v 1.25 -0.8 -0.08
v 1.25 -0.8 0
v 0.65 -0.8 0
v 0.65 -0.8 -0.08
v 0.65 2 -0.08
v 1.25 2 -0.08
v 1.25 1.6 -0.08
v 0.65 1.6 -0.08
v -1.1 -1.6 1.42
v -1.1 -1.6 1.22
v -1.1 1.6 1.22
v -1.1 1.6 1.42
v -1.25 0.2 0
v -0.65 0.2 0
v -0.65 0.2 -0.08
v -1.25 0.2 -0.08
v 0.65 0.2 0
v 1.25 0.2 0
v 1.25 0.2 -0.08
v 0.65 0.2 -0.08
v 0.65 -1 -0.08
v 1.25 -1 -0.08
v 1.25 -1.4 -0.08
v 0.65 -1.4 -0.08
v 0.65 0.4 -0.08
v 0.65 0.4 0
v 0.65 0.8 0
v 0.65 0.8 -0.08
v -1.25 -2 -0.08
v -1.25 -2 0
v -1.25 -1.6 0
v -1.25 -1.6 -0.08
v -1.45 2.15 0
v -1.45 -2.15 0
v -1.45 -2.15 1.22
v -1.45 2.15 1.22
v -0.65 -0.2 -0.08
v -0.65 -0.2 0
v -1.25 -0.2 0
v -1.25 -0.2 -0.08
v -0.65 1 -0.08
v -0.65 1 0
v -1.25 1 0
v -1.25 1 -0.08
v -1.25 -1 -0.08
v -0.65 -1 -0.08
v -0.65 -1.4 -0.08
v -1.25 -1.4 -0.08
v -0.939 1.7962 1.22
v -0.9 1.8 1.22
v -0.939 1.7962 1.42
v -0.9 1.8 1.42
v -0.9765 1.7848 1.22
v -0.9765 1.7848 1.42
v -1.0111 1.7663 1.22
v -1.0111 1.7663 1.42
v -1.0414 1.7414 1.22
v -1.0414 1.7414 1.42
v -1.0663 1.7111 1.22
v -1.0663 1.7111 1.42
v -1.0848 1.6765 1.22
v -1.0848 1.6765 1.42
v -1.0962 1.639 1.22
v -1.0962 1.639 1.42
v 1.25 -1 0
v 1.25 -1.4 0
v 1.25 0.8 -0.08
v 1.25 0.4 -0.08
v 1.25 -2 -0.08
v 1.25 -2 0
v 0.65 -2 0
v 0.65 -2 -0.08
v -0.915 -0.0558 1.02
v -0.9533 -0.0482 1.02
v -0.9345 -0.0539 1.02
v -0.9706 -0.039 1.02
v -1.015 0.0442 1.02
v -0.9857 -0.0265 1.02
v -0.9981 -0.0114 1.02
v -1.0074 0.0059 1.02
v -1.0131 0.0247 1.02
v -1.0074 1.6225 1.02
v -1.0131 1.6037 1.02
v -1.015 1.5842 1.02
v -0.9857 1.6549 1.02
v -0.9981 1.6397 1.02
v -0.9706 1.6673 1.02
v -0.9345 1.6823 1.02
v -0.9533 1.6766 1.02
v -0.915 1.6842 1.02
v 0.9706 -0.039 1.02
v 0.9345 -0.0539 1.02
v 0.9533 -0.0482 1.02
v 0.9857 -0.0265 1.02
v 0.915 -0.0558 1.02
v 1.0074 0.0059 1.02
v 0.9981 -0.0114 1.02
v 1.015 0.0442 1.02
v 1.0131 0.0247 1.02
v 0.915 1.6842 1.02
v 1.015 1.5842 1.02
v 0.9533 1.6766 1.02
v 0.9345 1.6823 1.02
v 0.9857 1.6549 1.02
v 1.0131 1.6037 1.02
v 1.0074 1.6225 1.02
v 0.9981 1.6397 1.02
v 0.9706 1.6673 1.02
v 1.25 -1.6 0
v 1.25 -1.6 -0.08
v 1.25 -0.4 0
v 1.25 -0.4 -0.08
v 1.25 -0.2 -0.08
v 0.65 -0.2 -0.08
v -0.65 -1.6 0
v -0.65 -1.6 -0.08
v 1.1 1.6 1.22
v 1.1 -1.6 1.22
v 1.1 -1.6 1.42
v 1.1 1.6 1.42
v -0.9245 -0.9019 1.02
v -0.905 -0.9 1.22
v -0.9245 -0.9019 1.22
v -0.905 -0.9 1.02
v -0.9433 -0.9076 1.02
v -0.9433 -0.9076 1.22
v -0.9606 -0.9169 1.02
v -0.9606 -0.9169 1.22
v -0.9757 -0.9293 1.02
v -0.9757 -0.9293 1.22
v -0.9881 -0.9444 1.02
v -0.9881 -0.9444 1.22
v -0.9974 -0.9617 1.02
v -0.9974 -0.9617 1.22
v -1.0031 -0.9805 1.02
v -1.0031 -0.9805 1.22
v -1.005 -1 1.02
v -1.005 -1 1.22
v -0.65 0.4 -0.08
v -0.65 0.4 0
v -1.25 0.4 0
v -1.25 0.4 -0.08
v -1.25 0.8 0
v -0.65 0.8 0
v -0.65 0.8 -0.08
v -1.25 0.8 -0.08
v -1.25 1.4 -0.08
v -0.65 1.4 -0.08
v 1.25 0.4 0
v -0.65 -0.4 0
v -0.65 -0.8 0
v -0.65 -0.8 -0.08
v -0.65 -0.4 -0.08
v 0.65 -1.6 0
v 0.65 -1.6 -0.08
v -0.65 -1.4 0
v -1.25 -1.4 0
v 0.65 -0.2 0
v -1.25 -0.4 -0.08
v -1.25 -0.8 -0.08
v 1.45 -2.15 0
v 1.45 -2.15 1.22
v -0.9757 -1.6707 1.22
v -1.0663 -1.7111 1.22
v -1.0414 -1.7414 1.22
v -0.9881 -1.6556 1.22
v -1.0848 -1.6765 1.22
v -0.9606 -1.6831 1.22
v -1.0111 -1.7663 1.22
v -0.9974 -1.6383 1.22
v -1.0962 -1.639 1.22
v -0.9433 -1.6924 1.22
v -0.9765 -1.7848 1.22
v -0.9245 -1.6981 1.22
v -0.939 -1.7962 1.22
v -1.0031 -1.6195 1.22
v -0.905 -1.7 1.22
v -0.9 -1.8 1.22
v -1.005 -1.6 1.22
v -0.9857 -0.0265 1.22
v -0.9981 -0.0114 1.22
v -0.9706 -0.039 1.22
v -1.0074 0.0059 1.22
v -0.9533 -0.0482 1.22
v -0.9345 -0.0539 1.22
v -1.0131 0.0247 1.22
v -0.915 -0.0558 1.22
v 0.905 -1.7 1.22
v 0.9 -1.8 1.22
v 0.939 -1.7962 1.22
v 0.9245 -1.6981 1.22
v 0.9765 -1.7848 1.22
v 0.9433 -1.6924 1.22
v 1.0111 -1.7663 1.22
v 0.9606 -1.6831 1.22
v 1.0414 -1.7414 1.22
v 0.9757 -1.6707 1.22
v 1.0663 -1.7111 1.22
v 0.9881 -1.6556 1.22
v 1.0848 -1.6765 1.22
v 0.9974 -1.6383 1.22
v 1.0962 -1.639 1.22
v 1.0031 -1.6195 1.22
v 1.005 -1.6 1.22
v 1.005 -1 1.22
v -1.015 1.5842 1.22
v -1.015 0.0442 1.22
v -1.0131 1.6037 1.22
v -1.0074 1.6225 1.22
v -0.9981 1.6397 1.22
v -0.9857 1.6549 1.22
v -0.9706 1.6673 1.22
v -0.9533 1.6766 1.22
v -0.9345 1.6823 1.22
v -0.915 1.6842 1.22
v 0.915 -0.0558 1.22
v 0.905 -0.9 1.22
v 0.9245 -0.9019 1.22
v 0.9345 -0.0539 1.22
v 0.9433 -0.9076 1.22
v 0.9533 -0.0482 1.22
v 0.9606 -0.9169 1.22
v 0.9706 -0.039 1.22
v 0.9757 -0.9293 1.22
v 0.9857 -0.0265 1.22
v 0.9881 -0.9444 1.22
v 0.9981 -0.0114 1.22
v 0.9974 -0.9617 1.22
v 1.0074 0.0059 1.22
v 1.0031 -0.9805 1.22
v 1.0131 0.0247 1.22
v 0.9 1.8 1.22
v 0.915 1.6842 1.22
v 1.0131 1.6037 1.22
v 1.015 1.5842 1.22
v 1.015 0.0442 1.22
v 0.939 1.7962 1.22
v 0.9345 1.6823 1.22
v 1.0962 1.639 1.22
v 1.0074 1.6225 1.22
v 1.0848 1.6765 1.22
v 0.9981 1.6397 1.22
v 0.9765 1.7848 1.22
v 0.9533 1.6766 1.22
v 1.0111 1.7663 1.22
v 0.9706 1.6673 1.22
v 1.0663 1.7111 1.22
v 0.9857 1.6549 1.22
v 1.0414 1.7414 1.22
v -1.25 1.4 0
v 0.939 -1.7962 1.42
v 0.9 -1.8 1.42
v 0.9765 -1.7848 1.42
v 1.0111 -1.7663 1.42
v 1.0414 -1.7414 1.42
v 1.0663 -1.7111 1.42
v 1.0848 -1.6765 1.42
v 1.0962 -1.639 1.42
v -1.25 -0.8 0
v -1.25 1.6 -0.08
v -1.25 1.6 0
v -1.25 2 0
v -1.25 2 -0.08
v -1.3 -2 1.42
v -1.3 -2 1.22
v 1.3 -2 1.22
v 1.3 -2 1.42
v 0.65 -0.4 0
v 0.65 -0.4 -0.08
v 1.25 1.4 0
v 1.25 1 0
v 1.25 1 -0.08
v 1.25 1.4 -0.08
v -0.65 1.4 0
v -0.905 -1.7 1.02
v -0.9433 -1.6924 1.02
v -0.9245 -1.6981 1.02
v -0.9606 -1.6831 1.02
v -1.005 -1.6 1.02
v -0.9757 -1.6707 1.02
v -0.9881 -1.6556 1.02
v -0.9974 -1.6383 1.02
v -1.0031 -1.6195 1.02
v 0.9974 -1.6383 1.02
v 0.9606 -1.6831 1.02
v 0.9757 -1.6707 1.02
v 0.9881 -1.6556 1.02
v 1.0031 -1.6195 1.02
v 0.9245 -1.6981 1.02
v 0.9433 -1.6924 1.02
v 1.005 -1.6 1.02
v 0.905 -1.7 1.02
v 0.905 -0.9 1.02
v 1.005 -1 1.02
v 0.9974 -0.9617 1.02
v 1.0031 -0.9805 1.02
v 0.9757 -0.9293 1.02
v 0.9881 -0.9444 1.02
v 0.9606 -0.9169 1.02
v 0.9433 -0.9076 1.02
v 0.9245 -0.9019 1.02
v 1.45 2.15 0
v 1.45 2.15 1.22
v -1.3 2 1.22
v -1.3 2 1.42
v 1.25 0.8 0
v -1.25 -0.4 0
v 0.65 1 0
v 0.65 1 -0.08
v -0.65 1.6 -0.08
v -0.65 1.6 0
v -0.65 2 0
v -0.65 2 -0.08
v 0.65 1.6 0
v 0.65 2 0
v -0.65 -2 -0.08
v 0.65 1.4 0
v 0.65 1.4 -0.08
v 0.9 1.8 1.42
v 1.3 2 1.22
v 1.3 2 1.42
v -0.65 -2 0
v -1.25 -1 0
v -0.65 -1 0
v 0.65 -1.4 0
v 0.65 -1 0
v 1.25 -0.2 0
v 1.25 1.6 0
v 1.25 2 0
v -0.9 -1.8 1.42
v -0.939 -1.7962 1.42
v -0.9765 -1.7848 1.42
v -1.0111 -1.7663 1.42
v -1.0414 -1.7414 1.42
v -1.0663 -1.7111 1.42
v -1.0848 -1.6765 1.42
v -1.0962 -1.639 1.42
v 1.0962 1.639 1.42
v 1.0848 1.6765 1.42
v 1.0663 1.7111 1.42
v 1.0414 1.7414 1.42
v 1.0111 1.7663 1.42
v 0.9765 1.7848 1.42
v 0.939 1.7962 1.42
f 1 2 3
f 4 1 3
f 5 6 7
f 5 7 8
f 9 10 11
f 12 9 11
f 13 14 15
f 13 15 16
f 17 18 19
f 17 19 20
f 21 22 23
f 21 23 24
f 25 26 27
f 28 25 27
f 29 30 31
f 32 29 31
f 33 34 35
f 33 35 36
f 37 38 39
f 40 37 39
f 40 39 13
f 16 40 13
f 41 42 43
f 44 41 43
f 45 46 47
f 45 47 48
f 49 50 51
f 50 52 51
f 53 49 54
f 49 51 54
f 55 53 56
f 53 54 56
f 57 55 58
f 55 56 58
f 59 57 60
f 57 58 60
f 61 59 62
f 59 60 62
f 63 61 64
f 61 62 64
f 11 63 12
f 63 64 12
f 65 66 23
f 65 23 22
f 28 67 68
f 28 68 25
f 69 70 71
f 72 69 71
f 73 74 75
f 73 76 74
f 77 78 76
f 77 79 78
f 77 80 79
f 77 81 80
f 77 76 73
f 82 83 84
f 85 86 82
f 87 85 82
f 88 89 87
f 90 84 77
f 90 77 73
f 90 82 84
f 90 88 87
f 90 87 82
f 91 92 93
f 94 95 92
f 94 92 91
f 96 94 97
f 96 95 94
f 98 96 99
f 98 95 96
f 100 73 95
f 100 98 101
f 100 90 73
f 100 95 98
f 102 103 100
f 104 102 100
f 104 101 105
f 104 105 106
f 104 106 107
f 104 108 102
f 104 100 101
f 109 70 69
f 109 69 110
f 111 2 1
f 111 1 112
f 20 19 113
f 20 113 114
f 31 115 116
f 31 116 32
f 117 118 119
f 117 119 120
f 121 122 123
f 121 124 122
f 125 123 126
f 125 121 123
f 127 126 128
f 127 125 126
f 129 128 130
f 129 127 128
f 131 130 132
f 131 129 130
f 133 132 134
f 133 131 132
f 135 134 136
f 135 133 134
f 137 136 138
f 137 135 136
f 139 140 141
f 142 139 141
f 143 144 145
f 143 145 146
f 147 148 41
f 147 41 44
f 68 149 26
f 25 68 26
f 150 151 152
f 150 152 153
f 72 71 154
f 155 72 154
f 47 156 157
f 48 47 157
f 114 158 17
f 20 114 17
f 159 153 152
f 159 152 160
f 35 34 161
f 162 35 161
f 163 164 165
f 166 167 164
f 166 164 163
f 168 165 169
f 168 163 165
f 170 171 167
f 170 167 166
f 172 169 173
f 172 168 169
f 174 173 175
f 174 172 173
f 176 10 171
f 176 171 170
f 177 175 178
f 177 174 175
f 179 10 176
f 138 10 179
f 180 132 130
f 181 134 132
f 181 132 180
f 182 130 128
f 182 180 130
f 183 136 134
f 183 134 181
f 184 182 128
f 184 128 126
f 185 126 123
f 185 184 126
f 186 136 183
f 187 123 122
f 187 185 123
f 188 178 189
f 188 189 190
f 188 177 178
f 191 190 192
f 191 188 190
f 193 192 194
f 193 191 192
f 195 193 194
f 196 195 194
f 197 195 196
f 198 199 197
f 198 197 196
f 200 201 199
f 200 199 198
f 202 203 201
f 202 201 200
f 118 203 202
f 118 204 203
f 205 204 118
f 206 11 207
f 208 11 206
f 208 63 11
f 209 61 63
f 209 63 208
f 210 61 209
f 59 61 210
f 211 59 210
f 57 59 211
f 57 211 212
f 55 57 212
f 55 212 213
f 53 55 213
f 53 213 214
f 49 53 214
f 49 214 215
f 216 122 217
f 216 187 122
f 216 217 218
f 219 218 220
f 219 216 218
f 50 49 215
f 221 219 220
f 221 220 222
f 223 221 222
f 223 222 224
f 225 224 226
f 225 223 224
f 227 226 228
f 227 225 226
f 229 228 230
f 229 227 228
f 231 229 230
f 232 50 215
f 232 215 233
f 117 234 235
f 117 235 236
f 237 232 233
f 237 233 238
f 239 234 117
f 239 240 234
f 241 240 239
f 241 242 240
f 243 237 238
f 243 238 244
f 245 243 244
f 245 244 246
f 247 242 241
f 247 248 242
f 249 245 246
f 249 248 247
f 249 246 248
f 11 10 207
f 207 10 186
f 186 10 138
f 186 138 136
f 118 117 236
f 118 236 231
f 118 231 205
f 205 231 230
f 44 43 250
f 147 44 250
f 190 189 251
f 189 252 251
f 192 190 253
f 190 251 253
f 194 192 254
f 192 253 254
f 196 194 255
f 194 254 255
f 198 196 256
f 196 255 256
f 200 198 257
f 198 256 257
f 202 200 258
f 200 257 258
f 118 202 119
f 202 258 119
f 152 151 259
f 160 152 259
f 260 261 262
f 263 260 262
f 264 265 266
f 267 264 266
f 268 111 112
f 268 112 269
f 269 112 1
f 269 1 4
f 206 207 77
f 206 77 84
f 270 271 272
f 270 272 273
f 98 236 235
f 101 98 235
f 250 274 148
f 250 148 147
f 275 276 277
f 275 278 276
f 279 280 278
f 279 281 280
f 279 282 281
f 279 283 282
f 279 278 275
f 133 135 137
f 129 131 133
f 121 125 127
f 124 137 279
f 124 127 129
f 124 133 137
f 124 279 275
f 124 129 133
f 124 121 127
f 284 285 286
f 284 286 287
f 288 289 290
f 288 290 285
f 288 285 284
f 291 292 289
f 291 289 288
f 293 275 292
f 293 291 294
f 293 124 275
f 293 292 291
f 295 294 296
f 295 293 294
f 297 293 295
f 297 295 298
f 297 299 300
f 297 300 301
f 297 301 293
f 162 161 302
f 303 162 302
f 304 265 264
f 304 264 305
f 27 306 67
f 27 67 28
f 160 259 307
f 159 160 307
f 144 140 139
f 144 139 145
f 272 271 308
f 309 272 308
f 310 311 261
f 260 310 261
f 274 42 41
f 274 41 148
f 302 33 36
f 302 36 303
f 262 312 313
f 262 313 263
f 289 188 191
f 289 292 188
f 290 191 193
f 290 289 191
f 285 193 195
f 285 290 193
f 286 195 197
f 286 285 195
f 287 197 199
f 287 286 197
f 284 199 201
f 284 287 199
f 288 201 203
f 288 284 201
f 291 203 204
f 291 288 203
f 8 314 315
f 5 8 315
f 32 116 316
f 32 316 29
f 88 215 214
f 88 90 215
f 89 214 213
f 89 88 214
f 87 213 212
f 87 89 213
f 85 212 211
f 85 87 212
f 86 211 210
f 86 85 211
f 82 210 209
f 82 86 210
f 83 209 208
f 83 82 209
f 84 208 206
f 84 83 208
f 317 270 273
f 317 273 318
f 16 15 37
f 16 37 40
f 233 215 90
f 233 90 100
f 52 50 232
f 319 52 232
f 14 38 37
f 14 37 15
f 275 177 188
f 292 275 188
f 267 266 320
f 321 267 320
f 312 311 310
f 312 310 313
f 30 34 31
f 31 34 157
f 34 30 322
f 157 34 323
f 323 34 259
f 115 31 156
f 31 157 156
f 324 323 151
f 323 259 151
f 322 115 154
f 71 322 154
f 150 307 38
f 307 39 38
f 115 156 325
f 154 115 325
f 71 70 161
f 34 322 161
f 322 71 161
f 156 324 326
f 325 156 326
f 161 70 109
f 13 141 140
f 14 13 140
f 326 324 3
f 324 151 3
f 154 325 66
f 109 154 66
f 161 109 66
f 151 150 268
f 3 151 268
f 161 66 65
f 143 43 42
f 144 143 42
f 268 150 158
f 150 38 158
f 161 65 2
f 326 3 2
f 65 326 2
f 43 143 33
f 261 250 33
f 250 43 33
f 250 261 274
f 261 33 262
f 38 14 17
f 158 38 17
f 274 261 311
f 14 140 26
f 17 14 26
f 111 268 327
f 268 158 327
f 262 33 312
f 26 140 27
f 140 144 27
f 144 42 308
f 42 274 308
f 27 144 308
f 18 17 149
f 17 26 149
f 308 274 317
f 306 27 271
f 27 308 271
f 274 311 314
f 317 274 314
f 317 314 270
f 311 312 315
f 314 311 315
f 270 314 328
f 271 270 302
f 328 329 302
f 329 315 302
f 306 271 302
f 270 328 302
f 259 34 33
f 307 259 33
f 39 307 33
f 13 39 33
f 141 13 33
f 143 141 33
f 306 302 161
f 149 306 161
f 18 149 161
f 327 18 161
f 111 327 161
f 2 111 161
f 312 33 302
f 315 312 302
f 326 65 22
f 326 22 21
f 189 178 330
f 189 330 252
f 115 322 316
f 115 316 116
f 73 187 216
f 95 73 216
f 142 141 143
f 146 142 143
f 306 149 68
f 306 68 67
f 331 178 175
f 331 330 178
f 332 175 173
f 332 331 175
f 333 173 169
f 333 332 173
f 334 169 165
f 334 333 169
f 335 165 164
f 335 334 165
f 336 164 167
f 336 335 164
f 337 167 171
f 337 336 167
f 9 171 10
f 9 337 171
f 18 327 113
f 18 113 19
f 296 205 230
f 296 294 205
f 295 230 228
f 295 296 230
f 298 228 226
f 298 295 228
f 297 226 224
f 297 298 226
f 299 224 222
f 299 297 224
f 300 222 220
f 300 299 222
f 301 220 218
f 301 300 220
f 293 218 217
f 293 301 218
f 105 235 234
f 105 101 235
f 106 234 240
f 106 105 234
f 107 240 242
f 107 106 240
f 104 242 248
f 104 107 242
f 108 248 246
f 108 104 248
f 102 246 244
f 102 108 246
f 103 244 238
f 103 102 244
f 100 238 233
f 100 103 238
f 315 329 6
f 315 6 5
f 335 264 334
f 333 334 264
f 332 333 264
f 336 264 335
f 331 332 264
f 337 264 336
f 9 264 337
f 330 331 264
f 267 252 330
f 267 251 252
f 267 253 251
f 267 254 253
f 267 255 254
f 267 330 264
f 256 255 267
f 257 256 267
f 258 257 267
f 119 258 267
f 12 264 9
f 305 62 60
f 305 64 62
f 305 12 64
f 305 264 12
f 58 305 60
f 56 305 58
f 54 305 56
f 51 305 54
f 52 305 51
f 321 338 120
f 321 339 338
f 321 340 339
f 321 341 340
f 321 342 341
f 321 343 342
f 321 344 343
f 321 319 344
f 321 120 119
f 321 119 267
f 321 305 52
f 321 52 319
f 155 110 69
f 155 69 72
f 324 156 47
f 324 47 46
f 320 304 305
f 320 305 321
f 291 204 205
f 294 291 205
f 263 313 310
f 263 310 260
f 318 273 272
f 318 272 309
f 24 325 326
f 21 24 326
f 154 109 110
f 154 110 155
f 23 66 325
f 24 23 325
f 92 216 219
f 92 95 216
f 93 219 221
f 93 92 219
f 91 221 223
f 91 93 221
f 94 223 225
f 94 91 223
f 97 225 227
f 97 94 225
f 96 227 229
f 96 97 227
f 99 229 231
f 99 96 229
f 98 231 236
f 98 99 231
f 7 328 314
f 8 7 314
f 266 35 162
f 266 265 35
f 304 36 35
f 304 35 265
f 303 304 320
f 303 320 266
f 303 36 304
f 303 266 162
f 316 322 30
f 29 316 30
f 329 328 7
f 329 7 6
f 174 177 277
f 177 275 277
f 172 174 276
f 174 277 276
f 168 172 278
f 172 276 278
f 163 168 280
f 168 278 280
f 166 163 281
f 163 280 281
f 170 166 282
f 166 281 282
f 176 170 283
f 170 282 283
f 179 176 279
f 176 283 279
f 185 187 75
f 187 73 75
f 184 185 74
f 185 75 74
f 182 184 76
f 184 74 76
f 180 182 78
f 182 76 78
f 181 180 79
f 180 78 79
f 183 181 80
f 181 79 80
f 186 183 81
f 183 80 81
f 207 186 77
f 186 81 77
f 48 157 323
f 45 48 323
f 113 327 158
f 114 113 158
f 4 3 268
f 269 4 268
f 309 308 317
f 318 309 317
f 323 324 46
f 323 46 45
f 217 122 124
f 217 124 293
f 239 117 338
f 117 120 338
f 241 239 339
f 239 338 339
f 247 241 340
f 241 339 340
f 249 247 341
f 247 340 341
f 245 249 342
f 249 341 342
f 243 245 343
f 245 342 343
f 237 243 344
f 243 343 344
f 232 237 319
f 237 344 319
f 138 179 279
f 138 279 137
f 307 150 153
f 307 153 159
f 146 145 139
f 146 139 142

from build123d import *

# Parameters (mm, degrees)
SKETCH1_W           = 2.9
SKETCH1_H           = 4.3
BOSS_EXTRUDE1_DEPTH = 1.22
SKETCH4_W           = 0.6
SKETCH4_H           = 0.4
BOSS_EXTRUDE2_DEPTH = 0.08
SKETCH3_W           = 2.03
SKETCH3_H           = 1.74
SKETCH3_W_2         = 2.01
SKETCH3_H_2         = 0.8
CUT_EXTRUDE2_DEPTH  = 0.2
FILLET1_R           = 0.1
SKETCH2_W           = 2.6
SKETCH2_H           = 4
SKETCH2_W_2         = 2.2
SKETCH2_H_2         = 3.6
BOSS_EXTRUDE3_DEPTH = 0.2
FILLET2_R           = 0.2


with BuildPart() as part:
    # Sketch1 → Boss-Extrude1 (new body)
    with BuildSketch(Plane.XY):
        Rectangle(SKETCH1_W, SKETCH1_H)
    extrude(amount=BOSS_EXTRUDE1_DEPTH)

    # Sketch4 → Boss-Extrude2 (add)
    with BuildSketch(Plane(origin=(0, 0, 0), x_dir=(-1, 0, 0), z_dir=(0, 0, -1))):
        with Locations((0.95, 1.8)):
            Rectangle(SKETCH4_W, SKETCH4_H)
        with Locations((-0.95, 1.8)):
            Rectangle(SKETCH4_W, SKETCH4_H)
        with Locations((0.95, 1.2)):
            Rectangle(SKETCH4_W, SKETCH4_H)
        with Locations((0.95, 0.6)):
            Rectangle(SKETCH4_W, SKETCH4_H)
        with Locations((0.95, 0)):
            Rectangle(SKETCH4_W, SKETCH4_H)
        with Locations((0.95, -0.6)):
            Rectangle(SKETCH4_W, SKETCH4_H)
        with Locations((0.95, -1.2)):
            Rectangle(SKETCH4_W, SKETCH4_H)
        with Locations((0.95, -1.8)):
            Rectangle(SKETCH4_W, SKETCH4_H)
        with Locations((-0.95, 1.2)):
            Rectangle(SKETCH4_W, SKETCH4_H)
        with Locations((-0.95, 0.6)):
            Rectangle(SKETCH4_W, SKETCH4_H)
        with Locations((-0.95, 0)):
            Rectangle(SKETCH4_W, SKETCH4_H)
        with Locations((-0.95, -0.6)):
            Rectangle(SKETCH4_W, SKETCH4_H)
        with Locations((-0.95, -1.2)):
            Rectangle(SKETCH4_W, SKETCH4_H)
        with Locations((-0.95, -1.8)):
            Rectangle(SKETCH4_W, SKETCH4_H)
    extrude(amount=BOSS_EXTRUDE2_DEPTH)

    # Sketch3 → Cut-Extrude2 (cut)
    with BuildSketch(Plane.XY.offset(1.22)):
        with Locations((0, 0.814186616)):
            Rectangle(SKETCH3_W, SKETCH3_H)
        with Locations((0, -1.3)):
            Rectangle(SKETCH3_W_2, SKETCH3_H_2)
    extrude(amount=-CUT_EXTRUDE2_DEPTH, mode=Mode.SUBTRACT)

    # Fillet1
    fillet1_edges = [part.edges().sort_by_distance(p)[0] for p in [
        (1.015, 1.684186616, 1.12),
        (1.015, -0.055813384, 1.12),
        (-1.015, -0.055813384, 1.12),
        (-1.015, 1.684186616, 1.12),
        (1.005, -0.9, 1.12),
        (1.005, -1.7, 1.12),
        (-1.005, -1.7, 1.12),
        (-1.005, -0.9, 1.12),
    ]]
    fillet(fillet1_edges, radius=FILLET1_R)

    # Sketch2 → Boss-Extrude3 (add)
    with BuildSketch(Plane.XY.offset(1.22)):
        Rectangle(SKETCH2_W, SKETCH2_H)
        Rectangle(SKETCH2_W_2, SKETCH2_H_2, mode=Mode.SUBTRACT)
    extrude(amount=BOSS_EXTRUDE3_DEPTH)

    # Fillet2
    fillet2_edges = [part.edges().sort_by_distance(p)[0] for p in [
        (1.1, -1.8, 1.32),
        (-1.1, -1.8, 1.32),
        (-1.1, 1.8, 1.32),
        (1.1, 1.8, 1.32),
    ]]
    fillet(fillet2_edges, radius=FILLET2_R)


solid = part.part
